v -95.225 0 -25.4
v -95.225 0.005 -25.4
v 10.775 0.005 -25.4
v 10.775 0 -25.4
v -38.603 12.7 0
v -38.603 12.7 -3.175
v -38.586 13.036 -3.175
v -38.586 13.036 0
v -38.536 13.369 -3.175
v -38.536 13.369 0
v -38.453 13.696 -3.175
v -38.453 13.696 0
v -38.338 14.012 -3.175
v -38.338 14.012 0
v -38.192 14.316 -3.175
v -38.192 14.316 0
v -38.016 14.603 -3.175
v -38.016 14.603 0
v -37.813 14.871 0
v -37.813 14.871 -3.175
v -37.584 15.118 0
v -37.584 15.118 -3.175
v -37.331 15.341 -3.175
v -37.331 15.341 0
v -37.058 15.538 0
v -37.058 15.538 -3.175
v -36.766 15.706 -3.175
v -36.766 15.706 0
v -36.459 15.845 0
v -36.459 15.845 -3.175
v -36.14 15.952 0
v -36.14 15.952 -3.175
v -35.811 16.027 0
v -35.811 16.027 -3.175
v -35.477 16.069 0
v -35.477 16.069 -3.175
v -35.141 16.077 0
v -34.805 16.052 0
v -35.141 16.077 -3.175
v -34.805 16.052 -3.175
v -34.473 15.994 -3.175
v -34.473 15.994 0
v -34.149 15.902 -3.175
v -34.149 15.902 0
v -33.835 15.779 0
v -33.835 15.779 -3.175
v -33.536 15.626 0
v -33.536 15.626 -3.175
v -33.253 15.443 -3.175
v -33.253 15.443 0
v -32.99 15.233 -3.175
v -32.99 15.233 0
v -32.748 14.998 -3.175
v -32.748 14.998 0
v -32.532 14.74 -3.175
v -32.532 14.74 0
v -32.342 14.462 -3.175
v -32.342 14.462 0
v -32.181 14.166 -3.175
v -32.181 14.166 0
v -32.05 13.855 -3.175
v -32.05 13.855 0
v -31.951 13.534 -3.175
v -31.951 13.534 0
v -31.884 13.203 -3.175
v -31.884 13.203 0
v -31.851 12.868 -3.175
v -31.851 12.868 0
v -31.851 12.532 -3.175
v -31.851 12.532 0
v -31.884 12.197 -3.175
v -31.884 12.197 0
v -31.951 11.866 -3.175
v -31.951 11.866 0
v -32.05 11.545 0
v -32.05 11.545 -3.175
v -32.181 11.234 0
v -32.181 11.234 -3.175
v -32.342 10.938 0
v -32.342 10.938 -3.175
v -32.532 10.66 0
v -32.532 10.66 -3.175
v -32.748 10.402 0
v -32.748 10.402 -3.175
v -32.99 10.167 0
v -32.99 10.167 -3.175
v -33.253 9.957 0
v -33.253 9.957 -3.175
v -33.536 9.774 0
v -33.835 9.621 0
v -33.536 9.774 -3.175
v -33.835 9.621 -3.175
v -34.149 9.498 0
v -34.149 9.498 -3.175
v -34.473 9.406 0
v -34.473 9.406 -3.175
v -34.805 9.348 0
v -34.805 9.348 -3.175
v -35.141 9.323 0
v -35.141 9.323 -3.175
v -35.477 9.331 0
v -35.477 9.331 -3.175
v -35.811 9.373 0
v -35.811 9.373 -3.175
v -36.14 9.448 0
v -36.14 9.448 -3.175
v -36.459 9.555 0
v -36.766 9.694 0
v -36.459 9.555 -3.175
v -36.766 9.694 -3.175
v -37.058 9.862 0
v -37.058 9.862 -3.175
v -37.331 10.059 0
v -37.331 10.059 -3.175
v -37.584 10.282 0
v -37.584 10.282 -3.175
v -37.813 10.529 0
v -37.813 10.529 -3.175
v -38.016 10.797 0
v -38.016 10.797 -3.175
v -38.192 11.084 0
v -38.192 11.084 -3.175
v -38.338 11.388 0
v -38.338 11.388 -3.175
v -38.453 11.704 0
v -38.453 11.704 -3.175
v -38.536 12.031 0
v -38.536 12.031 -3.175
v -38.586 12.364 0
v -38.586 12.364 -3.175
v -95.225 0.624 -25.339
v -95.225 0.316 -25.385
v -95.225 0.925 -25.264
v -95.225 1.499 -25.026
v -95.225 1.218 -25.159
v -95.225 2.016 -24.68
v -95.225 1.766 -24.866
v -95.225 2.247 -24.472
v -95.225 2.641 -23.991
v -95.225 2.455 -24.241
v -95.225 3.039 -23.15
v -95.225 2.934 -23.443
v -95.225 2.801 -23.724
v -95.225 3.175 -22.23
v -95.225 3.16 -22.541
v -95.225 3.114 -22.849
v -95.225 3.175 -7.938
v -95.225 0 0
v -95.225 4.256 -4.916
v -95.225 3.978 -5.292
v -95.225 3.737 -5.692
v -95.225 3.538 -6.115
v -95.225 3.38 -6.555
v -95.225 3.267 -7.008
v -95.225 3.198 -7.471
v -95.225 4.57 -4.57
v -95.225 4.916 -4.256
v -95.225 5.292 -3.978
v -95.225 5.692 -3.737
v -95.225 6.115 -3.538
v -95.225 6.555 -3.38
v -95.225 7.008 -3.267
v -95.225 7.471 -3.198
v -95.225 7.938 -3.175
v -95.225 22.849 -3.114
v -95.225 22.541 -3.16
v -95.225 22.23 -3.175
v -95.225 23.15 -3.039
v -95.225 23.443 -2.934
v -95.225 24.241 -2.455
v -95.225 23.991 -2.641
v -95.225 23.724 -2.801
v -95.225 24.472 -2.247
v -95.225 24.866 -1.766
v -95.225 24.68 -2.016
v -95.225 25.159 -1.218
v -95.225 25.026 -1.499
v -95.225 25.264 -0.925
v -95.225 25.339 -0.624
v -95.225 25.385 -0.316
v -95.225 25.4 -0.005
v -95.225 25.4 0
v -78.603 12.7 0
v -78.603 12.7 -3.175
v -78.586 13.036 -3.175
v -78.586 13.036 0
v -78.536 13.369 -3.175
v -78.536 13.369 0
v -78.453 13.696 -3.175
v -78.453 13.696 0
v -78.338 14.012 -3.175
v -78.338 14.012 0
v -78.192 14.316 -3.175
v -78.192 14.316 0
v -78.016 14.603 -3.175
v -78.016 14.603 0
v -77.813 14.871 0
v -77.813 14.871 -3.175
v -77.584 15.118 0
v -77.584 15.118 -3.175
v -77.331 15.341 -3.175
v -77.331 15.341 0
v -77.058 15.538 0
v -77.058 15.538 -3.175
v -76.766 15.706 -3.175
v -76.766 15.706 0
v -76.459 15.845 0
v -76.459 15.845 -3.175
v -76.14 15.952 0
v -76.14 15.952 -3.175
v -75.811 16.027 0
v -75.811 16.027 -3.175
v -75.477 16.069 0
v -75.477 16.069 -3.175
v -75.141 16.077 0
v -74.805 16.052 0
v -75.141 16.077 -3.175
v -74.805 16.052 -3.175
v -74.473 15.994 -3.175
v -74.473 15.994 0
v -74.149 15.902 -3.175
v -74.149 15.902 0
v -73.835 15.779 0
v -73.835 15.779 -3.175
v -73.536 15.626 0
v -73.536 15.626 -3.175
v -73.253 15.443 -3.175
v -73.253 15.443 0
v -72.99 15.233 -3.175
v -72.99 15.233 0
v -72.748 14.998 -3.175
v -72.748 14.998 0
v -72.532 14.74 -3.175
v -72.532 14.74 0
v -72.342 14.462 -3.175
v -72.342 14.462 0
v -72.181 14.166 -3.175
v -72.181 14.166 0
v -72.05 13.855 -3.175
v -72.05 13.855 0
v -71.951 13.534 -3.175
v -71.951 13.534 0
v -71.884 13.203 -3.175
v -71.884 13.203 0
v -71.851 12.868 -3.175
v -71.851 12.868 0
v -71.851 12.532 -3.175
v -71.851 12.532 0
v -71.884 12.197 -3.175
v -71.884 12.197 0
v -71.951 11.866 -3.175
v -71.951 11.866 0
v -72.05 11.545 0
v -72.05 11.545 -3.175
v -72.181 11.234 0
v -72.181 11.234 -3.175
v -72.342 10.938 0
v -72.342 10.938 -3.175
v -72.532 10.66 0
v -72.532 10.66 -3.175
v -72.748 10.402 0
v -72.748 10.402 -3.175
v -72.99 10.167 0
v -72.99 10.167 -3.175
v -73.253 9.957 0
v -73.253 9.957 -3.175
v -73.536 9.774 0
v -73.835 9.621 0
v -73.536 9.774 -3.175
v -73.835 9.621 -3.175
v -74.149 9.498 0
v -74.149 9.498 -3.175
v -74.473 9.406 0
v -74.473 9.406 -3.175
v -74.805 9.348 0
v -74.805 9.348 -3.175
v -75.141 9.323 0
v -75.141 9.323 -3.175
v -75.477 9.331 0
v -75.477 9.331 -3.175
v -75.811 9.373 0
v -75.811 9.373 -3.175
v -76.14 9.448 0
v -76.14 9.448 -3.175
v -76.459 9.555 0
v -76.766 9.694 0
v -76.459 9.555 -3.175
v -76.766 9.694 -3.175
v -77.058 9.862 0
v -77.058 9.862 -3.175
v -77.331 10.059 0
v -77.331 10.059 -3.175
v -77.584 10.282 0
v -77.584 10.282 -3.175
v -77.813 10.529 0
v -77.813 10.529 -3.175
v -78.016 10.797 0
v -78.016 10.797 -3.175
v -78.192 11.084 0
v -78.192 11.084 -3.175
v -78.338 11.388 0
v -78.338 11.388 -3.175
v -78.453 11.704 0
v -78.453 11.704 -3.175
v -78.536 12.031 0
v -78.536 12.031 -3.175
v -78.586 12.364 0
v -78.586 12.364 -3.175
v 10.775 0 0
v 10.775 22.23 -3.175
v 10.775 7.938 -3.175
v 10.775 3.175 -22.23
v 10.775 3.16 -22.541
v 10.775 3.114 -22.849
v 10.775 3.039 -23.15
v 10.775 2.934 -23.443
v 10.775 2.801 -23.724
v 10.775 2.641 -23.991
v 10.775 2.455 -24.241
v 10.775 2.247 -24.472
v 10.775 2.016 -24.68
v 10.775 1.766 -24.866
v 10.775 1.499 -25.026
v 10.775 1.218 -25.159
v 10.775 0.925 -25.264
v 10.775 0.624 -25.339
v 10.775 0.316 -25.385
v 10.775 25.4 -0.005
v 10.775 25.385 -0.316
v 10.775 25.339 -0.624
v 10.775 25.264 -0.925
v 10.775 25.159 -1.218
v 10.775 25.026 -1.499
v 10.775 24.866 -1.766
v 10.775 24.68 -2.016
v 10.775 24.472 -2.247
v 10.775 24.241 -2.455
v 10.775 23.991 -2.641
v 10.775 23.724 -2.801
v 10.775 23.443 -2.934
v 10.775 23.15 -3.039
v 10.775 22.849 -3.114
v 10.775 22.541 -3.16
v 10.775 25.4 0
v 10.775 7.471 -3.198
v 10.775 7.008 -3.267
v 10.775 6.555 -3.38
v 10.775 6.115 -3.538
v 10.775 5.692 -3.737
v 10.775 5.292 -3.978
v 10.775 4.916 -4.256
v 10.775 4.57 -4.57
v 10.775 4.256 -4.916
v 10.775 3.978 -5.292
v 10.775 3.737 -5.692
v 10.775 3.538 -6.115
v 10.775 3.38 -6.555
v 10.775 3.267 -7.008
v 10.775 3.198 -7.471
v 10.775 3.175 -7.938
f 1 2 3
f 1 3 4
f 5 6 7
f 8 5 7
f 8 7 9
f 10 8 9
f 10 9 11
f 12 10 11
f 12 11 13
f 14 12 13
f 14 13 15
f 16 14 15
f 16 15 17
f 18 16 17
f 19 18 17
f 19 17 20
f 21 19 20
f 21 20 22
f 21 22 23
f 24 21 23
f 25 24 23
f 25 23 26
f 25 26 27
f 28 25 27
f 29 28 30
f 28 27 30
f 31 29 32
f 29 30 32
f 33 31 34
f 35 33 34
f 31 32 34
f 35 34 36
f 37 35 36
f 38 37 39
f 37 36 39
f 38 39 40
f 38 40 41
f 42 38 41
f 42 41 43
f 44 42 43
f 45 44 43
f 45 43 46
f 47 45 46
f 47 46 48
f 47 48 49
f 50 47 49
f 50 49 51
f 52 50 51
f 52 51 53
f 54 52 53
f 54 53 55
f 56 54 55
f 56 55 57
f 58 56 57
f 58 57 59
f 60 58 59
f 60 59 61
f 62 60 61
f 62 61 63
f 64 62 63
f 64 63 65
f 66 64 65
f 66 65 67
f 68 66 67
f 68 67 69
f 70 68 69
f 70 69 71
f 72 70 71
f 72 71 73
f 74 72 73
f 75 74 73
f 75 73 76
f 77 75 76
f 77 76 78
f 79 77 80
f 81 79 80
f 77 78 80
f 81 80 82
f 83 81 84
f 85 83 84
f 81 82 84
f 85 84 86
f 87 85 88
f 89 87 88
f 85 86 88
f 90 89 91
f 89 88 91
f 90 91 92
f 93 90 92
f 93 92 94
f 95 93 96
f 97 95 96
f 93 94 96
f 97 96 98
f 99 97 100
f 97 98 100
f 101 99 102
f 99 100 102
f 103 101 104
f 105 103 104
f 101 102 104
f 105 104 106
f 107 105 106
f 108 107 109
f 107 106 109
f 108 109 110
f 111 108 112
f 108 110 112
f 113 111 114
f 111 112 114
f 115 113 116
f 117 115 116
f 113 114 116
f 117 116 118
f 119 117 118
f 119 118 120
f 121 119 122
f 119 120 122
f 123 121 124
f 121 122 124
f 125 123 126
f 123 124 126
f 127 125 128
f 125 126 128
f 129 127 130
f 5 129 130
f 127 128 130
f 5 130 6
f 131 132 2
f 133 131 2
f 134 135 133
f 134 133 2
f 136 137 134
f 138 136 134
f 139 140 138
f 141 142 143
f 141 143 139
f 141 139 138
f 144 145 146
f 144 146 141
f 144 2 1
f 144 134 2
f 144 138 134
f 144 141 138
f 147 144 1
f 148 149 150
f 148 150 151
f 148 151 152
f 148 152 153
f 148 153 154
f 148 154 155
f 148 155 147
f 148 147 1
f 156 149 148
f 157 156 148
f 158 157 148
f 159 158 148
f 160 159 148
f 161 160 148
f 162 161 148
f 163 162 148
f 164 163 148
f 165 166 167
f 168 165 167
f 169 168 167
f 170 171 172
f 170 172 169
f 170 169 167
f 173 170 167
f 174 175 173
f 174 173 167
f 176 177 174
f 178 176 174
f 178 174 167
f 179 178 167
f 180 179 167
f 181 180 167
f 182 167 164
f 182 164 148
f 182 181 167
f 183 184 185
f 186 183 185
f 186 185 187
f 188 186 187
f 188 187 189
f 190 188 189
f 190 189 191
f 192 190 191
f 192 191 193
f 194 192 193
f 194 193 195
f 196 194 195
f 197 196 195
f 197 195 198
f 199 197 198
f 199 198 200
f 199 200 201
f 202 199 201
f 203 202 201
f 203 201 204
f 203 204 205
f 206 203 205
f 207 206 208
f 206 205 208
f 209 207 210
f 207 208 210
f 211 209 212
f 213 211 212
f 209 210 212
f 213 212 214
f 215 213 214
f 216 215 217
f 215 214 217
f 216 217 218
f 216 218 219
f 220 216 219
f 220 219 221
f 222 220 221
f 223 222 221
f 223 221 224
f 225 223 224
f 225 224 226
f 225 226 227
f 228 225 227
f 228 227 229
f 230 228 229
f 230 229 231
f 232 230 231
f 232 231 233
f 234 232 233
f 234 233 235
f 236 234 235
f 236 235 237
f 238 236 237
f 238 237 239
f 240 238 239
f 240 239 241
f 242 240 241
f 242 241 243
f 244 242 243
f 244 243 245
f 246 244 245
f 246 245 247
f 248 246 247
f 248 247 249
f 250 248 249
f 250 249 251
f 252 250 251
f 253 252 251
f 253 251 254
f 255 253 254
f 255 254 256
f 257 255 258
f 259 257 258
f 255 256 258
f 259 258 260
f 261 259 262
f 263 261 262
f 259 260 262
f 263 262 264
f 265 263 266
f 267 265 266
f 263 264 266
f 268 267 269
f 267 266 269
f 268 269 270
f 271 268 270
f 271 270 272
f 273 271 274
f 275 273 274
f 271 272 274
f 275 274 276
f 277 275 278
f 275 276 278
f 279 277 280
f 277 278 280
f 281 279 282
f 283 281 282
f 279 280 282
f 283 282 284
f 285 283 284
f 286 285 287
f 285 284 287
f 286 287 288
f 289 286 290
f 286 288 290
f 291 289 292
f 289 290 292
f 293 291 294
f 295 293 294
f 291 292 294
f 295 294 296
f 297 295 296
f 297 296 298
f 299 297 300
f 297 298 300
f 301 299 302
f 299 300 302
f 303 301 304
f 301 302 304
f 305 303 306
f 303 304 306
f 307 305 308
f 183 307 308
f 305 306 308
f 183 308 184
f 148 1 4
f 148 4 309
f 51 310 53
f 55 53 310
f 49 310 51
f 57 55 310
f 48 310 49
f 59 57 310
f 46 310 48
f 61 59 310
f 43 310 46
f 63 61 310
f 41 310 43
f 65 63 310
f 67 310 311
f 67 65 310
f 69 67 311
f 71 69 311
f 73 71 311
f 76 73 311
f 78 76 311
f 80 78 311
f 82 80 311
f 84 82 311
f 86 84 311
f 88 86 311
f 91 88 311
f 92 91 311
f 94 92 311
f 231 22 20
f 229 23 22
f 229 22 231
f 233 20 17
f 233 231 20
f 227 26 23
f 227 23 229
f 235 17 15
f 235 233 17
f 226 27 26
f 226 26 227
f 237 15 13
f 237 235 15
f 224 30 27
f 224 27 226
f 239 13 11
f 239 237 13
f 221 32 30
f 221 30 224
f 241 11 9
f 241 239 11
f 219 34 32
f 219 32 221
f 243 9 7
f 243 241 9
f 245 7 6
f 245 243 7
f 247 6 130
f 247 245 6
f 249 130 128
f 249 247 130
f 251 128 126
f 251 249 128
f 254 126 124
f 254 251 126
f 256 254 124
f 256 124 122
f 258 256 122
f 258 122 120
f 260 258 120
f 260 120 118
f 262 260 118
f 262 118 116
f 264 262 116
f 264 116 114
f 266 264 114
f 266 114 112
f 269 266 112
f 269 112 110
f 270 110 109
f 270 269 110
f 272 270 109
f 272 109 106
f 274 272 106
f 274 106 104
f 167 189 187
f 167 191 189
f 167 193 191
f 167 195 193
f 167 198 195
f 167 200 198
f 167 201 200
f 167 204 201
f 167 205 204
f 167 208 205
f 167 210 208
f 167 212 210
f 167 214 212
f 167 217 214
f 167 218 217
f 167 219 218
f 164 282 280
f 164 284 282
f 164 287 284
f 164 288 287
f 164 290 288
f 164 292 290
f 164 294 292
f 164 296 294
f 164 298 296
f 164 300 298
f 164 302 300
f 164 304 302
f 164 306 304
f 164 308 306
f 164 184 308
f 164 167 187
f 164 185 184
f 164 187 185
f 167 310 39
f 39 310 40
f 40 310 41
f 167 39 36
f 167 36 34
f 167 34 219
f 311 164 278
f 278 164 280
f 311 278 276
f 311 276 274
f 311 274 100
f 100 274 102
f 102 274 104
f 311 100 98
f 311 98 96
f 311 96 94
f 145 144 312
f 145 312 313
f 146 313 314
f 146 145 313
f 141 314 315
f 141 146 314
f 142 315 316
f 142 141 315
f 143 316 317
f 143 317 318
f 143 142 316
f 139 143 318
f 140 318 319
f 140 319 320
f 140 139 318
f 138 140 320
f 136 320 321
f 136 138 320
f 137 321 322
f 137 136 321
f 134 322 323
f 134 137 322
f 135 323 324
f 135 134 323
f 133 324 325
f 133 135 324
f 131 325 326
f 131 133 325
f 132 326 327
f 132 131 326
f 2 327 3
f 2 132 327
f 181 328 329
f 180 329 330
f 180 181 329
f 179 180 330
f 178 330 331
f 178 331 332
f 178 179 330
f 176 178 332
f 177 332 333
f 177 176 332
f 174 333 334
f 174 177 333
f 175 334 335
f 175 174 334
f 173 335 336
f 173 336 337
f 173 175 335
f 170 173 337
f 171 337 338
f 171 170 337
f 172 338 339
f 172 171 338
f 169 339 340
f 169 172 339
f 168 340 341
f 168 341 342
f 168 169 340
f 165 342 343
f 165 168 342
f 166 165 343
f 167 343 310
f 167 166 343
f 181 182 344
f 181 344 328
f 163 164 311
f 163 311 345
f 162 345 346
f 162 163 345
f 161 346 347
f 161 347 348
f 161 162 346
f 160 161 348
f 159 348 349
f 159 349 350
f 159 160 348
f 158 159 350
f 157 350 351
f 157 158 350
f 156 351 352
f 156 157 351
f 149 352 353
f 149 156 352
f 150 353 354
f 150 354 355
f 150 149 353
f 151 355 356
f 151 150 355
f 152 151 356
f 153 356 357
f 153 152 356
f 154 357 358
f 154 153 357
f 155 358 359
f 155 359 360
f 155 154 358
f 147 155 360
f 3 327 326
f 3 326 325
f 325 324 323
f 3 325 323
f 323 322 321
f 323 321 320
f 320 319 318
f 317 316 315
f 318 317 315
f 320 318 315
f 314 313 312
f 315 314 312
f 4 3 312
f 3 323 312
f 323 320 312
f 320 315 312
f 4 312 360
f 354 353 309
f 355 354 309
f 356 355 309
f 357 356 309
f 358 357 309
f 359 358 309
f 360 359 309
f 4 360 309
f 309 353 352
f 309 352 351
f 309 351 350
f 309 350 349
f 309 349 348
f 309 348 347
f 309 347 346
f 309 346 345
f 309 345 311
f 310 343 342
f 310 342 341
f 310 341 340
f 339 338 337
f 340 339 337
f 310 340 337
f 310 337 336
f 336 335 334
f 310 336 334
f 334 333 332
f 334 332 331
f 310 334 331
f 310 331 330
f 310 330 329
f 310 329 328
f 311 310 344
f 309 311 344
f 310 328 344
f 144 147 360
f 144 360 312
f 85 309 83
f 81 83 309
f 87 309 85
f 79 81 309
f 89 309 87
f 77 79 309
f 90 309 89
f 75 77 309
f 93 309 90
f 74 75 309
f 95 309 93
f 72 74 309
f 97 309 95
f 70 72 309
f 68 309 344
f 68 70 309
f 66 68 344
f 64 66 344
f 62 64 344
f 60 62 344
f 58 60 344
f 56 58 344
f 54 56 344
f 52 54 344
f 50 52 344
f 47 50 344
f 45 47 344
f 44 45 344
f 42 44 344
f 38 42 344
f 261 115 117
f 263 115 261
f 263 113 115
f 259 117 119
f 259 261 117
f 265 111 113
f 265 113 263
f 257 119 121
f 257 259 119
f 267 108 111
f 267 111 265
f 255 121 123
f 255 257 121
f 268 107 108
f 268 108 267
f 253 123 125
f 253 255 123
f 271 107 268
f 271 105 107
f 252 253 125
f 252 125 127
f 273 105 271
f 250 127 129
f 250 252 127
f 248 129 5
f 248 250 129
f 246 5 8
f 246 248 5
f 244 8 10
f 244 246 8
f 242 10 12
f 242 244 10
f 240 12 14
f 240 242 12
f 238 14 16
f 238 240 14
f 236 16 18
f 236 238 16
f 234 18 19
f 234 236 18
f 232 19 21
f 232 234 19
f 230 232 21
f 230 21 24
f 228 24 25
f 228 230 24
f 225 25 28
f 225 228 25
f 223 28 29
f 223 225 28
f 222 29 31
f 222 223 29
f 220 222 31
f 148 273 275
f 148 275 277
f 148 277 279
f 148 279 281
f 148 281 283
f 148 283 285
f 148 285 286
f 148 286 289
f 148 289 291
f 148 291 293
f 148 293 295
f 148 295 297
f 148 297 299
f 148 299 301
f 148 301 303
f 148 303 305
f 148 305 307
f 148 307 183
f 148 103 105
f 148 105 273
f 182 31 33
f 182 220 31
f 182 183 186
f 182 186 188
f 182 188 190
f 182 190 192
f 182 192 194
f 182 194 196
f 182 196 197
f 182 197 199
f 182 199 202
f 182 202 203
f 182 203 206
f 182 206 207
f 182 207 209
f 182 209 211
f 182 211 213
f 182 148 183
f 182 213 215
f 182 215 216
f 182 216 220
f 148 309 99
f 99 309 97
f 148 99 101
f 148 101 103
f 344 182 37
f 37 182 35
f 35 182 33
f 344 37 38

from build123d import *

# Parameters (mm, degrees)
MIEMBRO_ESTRUCTURAL1_DEPTH    = 106
TALADRO_DE_MARGEN_PARA_1_41_D = 6.7564


with BuildPart() as part:
    # Sketch12 → Miembro estructural1 (new body)
    with BuildSketch(Plane(origin=(-95.224809186, 0, 0), x_dir=(0, 0, -1), z_dir=(1, 0, 0))):
        with BuildLine():
            Line((0, 0), (0, 25.4))
            Line((0, 25.4), (0.00508, 25.4))
            ThreePointArc((0.00508, 25.4), (2.246551928, 24.471551928), (3.175, 22.23008))
            Line((3.175, 22.23008), (3.175, 7.9375))
            ThreePointArc((3.175, 7.9375), (4.569903955, 4.569903955), (7.9375, 3.175))
            Line((7.9375, 3.175), (22.23008, 3.175))
            ThreePointArc((22.23008, 3.175), (24.471551928, 2.246551928), (25.4, 0.00508))
            Line((25.4, 0.00508), (25.4, 0))
            Line((25.4, 0), (0, 0))
        make_face()
    extrude(amount=MIEMBRO_ESTRUCTURAL1_DEPTH)

    # Taladro de margen para 1/41 (through all)
    with Locations(Plane.XY):
        with Locations((-35.224809186, 12.7), (-75.224809186, 12.7)):
            Hole(TALADRO_DE_MARGEN_PARA_1_41_D / 2)


solid = part.part
